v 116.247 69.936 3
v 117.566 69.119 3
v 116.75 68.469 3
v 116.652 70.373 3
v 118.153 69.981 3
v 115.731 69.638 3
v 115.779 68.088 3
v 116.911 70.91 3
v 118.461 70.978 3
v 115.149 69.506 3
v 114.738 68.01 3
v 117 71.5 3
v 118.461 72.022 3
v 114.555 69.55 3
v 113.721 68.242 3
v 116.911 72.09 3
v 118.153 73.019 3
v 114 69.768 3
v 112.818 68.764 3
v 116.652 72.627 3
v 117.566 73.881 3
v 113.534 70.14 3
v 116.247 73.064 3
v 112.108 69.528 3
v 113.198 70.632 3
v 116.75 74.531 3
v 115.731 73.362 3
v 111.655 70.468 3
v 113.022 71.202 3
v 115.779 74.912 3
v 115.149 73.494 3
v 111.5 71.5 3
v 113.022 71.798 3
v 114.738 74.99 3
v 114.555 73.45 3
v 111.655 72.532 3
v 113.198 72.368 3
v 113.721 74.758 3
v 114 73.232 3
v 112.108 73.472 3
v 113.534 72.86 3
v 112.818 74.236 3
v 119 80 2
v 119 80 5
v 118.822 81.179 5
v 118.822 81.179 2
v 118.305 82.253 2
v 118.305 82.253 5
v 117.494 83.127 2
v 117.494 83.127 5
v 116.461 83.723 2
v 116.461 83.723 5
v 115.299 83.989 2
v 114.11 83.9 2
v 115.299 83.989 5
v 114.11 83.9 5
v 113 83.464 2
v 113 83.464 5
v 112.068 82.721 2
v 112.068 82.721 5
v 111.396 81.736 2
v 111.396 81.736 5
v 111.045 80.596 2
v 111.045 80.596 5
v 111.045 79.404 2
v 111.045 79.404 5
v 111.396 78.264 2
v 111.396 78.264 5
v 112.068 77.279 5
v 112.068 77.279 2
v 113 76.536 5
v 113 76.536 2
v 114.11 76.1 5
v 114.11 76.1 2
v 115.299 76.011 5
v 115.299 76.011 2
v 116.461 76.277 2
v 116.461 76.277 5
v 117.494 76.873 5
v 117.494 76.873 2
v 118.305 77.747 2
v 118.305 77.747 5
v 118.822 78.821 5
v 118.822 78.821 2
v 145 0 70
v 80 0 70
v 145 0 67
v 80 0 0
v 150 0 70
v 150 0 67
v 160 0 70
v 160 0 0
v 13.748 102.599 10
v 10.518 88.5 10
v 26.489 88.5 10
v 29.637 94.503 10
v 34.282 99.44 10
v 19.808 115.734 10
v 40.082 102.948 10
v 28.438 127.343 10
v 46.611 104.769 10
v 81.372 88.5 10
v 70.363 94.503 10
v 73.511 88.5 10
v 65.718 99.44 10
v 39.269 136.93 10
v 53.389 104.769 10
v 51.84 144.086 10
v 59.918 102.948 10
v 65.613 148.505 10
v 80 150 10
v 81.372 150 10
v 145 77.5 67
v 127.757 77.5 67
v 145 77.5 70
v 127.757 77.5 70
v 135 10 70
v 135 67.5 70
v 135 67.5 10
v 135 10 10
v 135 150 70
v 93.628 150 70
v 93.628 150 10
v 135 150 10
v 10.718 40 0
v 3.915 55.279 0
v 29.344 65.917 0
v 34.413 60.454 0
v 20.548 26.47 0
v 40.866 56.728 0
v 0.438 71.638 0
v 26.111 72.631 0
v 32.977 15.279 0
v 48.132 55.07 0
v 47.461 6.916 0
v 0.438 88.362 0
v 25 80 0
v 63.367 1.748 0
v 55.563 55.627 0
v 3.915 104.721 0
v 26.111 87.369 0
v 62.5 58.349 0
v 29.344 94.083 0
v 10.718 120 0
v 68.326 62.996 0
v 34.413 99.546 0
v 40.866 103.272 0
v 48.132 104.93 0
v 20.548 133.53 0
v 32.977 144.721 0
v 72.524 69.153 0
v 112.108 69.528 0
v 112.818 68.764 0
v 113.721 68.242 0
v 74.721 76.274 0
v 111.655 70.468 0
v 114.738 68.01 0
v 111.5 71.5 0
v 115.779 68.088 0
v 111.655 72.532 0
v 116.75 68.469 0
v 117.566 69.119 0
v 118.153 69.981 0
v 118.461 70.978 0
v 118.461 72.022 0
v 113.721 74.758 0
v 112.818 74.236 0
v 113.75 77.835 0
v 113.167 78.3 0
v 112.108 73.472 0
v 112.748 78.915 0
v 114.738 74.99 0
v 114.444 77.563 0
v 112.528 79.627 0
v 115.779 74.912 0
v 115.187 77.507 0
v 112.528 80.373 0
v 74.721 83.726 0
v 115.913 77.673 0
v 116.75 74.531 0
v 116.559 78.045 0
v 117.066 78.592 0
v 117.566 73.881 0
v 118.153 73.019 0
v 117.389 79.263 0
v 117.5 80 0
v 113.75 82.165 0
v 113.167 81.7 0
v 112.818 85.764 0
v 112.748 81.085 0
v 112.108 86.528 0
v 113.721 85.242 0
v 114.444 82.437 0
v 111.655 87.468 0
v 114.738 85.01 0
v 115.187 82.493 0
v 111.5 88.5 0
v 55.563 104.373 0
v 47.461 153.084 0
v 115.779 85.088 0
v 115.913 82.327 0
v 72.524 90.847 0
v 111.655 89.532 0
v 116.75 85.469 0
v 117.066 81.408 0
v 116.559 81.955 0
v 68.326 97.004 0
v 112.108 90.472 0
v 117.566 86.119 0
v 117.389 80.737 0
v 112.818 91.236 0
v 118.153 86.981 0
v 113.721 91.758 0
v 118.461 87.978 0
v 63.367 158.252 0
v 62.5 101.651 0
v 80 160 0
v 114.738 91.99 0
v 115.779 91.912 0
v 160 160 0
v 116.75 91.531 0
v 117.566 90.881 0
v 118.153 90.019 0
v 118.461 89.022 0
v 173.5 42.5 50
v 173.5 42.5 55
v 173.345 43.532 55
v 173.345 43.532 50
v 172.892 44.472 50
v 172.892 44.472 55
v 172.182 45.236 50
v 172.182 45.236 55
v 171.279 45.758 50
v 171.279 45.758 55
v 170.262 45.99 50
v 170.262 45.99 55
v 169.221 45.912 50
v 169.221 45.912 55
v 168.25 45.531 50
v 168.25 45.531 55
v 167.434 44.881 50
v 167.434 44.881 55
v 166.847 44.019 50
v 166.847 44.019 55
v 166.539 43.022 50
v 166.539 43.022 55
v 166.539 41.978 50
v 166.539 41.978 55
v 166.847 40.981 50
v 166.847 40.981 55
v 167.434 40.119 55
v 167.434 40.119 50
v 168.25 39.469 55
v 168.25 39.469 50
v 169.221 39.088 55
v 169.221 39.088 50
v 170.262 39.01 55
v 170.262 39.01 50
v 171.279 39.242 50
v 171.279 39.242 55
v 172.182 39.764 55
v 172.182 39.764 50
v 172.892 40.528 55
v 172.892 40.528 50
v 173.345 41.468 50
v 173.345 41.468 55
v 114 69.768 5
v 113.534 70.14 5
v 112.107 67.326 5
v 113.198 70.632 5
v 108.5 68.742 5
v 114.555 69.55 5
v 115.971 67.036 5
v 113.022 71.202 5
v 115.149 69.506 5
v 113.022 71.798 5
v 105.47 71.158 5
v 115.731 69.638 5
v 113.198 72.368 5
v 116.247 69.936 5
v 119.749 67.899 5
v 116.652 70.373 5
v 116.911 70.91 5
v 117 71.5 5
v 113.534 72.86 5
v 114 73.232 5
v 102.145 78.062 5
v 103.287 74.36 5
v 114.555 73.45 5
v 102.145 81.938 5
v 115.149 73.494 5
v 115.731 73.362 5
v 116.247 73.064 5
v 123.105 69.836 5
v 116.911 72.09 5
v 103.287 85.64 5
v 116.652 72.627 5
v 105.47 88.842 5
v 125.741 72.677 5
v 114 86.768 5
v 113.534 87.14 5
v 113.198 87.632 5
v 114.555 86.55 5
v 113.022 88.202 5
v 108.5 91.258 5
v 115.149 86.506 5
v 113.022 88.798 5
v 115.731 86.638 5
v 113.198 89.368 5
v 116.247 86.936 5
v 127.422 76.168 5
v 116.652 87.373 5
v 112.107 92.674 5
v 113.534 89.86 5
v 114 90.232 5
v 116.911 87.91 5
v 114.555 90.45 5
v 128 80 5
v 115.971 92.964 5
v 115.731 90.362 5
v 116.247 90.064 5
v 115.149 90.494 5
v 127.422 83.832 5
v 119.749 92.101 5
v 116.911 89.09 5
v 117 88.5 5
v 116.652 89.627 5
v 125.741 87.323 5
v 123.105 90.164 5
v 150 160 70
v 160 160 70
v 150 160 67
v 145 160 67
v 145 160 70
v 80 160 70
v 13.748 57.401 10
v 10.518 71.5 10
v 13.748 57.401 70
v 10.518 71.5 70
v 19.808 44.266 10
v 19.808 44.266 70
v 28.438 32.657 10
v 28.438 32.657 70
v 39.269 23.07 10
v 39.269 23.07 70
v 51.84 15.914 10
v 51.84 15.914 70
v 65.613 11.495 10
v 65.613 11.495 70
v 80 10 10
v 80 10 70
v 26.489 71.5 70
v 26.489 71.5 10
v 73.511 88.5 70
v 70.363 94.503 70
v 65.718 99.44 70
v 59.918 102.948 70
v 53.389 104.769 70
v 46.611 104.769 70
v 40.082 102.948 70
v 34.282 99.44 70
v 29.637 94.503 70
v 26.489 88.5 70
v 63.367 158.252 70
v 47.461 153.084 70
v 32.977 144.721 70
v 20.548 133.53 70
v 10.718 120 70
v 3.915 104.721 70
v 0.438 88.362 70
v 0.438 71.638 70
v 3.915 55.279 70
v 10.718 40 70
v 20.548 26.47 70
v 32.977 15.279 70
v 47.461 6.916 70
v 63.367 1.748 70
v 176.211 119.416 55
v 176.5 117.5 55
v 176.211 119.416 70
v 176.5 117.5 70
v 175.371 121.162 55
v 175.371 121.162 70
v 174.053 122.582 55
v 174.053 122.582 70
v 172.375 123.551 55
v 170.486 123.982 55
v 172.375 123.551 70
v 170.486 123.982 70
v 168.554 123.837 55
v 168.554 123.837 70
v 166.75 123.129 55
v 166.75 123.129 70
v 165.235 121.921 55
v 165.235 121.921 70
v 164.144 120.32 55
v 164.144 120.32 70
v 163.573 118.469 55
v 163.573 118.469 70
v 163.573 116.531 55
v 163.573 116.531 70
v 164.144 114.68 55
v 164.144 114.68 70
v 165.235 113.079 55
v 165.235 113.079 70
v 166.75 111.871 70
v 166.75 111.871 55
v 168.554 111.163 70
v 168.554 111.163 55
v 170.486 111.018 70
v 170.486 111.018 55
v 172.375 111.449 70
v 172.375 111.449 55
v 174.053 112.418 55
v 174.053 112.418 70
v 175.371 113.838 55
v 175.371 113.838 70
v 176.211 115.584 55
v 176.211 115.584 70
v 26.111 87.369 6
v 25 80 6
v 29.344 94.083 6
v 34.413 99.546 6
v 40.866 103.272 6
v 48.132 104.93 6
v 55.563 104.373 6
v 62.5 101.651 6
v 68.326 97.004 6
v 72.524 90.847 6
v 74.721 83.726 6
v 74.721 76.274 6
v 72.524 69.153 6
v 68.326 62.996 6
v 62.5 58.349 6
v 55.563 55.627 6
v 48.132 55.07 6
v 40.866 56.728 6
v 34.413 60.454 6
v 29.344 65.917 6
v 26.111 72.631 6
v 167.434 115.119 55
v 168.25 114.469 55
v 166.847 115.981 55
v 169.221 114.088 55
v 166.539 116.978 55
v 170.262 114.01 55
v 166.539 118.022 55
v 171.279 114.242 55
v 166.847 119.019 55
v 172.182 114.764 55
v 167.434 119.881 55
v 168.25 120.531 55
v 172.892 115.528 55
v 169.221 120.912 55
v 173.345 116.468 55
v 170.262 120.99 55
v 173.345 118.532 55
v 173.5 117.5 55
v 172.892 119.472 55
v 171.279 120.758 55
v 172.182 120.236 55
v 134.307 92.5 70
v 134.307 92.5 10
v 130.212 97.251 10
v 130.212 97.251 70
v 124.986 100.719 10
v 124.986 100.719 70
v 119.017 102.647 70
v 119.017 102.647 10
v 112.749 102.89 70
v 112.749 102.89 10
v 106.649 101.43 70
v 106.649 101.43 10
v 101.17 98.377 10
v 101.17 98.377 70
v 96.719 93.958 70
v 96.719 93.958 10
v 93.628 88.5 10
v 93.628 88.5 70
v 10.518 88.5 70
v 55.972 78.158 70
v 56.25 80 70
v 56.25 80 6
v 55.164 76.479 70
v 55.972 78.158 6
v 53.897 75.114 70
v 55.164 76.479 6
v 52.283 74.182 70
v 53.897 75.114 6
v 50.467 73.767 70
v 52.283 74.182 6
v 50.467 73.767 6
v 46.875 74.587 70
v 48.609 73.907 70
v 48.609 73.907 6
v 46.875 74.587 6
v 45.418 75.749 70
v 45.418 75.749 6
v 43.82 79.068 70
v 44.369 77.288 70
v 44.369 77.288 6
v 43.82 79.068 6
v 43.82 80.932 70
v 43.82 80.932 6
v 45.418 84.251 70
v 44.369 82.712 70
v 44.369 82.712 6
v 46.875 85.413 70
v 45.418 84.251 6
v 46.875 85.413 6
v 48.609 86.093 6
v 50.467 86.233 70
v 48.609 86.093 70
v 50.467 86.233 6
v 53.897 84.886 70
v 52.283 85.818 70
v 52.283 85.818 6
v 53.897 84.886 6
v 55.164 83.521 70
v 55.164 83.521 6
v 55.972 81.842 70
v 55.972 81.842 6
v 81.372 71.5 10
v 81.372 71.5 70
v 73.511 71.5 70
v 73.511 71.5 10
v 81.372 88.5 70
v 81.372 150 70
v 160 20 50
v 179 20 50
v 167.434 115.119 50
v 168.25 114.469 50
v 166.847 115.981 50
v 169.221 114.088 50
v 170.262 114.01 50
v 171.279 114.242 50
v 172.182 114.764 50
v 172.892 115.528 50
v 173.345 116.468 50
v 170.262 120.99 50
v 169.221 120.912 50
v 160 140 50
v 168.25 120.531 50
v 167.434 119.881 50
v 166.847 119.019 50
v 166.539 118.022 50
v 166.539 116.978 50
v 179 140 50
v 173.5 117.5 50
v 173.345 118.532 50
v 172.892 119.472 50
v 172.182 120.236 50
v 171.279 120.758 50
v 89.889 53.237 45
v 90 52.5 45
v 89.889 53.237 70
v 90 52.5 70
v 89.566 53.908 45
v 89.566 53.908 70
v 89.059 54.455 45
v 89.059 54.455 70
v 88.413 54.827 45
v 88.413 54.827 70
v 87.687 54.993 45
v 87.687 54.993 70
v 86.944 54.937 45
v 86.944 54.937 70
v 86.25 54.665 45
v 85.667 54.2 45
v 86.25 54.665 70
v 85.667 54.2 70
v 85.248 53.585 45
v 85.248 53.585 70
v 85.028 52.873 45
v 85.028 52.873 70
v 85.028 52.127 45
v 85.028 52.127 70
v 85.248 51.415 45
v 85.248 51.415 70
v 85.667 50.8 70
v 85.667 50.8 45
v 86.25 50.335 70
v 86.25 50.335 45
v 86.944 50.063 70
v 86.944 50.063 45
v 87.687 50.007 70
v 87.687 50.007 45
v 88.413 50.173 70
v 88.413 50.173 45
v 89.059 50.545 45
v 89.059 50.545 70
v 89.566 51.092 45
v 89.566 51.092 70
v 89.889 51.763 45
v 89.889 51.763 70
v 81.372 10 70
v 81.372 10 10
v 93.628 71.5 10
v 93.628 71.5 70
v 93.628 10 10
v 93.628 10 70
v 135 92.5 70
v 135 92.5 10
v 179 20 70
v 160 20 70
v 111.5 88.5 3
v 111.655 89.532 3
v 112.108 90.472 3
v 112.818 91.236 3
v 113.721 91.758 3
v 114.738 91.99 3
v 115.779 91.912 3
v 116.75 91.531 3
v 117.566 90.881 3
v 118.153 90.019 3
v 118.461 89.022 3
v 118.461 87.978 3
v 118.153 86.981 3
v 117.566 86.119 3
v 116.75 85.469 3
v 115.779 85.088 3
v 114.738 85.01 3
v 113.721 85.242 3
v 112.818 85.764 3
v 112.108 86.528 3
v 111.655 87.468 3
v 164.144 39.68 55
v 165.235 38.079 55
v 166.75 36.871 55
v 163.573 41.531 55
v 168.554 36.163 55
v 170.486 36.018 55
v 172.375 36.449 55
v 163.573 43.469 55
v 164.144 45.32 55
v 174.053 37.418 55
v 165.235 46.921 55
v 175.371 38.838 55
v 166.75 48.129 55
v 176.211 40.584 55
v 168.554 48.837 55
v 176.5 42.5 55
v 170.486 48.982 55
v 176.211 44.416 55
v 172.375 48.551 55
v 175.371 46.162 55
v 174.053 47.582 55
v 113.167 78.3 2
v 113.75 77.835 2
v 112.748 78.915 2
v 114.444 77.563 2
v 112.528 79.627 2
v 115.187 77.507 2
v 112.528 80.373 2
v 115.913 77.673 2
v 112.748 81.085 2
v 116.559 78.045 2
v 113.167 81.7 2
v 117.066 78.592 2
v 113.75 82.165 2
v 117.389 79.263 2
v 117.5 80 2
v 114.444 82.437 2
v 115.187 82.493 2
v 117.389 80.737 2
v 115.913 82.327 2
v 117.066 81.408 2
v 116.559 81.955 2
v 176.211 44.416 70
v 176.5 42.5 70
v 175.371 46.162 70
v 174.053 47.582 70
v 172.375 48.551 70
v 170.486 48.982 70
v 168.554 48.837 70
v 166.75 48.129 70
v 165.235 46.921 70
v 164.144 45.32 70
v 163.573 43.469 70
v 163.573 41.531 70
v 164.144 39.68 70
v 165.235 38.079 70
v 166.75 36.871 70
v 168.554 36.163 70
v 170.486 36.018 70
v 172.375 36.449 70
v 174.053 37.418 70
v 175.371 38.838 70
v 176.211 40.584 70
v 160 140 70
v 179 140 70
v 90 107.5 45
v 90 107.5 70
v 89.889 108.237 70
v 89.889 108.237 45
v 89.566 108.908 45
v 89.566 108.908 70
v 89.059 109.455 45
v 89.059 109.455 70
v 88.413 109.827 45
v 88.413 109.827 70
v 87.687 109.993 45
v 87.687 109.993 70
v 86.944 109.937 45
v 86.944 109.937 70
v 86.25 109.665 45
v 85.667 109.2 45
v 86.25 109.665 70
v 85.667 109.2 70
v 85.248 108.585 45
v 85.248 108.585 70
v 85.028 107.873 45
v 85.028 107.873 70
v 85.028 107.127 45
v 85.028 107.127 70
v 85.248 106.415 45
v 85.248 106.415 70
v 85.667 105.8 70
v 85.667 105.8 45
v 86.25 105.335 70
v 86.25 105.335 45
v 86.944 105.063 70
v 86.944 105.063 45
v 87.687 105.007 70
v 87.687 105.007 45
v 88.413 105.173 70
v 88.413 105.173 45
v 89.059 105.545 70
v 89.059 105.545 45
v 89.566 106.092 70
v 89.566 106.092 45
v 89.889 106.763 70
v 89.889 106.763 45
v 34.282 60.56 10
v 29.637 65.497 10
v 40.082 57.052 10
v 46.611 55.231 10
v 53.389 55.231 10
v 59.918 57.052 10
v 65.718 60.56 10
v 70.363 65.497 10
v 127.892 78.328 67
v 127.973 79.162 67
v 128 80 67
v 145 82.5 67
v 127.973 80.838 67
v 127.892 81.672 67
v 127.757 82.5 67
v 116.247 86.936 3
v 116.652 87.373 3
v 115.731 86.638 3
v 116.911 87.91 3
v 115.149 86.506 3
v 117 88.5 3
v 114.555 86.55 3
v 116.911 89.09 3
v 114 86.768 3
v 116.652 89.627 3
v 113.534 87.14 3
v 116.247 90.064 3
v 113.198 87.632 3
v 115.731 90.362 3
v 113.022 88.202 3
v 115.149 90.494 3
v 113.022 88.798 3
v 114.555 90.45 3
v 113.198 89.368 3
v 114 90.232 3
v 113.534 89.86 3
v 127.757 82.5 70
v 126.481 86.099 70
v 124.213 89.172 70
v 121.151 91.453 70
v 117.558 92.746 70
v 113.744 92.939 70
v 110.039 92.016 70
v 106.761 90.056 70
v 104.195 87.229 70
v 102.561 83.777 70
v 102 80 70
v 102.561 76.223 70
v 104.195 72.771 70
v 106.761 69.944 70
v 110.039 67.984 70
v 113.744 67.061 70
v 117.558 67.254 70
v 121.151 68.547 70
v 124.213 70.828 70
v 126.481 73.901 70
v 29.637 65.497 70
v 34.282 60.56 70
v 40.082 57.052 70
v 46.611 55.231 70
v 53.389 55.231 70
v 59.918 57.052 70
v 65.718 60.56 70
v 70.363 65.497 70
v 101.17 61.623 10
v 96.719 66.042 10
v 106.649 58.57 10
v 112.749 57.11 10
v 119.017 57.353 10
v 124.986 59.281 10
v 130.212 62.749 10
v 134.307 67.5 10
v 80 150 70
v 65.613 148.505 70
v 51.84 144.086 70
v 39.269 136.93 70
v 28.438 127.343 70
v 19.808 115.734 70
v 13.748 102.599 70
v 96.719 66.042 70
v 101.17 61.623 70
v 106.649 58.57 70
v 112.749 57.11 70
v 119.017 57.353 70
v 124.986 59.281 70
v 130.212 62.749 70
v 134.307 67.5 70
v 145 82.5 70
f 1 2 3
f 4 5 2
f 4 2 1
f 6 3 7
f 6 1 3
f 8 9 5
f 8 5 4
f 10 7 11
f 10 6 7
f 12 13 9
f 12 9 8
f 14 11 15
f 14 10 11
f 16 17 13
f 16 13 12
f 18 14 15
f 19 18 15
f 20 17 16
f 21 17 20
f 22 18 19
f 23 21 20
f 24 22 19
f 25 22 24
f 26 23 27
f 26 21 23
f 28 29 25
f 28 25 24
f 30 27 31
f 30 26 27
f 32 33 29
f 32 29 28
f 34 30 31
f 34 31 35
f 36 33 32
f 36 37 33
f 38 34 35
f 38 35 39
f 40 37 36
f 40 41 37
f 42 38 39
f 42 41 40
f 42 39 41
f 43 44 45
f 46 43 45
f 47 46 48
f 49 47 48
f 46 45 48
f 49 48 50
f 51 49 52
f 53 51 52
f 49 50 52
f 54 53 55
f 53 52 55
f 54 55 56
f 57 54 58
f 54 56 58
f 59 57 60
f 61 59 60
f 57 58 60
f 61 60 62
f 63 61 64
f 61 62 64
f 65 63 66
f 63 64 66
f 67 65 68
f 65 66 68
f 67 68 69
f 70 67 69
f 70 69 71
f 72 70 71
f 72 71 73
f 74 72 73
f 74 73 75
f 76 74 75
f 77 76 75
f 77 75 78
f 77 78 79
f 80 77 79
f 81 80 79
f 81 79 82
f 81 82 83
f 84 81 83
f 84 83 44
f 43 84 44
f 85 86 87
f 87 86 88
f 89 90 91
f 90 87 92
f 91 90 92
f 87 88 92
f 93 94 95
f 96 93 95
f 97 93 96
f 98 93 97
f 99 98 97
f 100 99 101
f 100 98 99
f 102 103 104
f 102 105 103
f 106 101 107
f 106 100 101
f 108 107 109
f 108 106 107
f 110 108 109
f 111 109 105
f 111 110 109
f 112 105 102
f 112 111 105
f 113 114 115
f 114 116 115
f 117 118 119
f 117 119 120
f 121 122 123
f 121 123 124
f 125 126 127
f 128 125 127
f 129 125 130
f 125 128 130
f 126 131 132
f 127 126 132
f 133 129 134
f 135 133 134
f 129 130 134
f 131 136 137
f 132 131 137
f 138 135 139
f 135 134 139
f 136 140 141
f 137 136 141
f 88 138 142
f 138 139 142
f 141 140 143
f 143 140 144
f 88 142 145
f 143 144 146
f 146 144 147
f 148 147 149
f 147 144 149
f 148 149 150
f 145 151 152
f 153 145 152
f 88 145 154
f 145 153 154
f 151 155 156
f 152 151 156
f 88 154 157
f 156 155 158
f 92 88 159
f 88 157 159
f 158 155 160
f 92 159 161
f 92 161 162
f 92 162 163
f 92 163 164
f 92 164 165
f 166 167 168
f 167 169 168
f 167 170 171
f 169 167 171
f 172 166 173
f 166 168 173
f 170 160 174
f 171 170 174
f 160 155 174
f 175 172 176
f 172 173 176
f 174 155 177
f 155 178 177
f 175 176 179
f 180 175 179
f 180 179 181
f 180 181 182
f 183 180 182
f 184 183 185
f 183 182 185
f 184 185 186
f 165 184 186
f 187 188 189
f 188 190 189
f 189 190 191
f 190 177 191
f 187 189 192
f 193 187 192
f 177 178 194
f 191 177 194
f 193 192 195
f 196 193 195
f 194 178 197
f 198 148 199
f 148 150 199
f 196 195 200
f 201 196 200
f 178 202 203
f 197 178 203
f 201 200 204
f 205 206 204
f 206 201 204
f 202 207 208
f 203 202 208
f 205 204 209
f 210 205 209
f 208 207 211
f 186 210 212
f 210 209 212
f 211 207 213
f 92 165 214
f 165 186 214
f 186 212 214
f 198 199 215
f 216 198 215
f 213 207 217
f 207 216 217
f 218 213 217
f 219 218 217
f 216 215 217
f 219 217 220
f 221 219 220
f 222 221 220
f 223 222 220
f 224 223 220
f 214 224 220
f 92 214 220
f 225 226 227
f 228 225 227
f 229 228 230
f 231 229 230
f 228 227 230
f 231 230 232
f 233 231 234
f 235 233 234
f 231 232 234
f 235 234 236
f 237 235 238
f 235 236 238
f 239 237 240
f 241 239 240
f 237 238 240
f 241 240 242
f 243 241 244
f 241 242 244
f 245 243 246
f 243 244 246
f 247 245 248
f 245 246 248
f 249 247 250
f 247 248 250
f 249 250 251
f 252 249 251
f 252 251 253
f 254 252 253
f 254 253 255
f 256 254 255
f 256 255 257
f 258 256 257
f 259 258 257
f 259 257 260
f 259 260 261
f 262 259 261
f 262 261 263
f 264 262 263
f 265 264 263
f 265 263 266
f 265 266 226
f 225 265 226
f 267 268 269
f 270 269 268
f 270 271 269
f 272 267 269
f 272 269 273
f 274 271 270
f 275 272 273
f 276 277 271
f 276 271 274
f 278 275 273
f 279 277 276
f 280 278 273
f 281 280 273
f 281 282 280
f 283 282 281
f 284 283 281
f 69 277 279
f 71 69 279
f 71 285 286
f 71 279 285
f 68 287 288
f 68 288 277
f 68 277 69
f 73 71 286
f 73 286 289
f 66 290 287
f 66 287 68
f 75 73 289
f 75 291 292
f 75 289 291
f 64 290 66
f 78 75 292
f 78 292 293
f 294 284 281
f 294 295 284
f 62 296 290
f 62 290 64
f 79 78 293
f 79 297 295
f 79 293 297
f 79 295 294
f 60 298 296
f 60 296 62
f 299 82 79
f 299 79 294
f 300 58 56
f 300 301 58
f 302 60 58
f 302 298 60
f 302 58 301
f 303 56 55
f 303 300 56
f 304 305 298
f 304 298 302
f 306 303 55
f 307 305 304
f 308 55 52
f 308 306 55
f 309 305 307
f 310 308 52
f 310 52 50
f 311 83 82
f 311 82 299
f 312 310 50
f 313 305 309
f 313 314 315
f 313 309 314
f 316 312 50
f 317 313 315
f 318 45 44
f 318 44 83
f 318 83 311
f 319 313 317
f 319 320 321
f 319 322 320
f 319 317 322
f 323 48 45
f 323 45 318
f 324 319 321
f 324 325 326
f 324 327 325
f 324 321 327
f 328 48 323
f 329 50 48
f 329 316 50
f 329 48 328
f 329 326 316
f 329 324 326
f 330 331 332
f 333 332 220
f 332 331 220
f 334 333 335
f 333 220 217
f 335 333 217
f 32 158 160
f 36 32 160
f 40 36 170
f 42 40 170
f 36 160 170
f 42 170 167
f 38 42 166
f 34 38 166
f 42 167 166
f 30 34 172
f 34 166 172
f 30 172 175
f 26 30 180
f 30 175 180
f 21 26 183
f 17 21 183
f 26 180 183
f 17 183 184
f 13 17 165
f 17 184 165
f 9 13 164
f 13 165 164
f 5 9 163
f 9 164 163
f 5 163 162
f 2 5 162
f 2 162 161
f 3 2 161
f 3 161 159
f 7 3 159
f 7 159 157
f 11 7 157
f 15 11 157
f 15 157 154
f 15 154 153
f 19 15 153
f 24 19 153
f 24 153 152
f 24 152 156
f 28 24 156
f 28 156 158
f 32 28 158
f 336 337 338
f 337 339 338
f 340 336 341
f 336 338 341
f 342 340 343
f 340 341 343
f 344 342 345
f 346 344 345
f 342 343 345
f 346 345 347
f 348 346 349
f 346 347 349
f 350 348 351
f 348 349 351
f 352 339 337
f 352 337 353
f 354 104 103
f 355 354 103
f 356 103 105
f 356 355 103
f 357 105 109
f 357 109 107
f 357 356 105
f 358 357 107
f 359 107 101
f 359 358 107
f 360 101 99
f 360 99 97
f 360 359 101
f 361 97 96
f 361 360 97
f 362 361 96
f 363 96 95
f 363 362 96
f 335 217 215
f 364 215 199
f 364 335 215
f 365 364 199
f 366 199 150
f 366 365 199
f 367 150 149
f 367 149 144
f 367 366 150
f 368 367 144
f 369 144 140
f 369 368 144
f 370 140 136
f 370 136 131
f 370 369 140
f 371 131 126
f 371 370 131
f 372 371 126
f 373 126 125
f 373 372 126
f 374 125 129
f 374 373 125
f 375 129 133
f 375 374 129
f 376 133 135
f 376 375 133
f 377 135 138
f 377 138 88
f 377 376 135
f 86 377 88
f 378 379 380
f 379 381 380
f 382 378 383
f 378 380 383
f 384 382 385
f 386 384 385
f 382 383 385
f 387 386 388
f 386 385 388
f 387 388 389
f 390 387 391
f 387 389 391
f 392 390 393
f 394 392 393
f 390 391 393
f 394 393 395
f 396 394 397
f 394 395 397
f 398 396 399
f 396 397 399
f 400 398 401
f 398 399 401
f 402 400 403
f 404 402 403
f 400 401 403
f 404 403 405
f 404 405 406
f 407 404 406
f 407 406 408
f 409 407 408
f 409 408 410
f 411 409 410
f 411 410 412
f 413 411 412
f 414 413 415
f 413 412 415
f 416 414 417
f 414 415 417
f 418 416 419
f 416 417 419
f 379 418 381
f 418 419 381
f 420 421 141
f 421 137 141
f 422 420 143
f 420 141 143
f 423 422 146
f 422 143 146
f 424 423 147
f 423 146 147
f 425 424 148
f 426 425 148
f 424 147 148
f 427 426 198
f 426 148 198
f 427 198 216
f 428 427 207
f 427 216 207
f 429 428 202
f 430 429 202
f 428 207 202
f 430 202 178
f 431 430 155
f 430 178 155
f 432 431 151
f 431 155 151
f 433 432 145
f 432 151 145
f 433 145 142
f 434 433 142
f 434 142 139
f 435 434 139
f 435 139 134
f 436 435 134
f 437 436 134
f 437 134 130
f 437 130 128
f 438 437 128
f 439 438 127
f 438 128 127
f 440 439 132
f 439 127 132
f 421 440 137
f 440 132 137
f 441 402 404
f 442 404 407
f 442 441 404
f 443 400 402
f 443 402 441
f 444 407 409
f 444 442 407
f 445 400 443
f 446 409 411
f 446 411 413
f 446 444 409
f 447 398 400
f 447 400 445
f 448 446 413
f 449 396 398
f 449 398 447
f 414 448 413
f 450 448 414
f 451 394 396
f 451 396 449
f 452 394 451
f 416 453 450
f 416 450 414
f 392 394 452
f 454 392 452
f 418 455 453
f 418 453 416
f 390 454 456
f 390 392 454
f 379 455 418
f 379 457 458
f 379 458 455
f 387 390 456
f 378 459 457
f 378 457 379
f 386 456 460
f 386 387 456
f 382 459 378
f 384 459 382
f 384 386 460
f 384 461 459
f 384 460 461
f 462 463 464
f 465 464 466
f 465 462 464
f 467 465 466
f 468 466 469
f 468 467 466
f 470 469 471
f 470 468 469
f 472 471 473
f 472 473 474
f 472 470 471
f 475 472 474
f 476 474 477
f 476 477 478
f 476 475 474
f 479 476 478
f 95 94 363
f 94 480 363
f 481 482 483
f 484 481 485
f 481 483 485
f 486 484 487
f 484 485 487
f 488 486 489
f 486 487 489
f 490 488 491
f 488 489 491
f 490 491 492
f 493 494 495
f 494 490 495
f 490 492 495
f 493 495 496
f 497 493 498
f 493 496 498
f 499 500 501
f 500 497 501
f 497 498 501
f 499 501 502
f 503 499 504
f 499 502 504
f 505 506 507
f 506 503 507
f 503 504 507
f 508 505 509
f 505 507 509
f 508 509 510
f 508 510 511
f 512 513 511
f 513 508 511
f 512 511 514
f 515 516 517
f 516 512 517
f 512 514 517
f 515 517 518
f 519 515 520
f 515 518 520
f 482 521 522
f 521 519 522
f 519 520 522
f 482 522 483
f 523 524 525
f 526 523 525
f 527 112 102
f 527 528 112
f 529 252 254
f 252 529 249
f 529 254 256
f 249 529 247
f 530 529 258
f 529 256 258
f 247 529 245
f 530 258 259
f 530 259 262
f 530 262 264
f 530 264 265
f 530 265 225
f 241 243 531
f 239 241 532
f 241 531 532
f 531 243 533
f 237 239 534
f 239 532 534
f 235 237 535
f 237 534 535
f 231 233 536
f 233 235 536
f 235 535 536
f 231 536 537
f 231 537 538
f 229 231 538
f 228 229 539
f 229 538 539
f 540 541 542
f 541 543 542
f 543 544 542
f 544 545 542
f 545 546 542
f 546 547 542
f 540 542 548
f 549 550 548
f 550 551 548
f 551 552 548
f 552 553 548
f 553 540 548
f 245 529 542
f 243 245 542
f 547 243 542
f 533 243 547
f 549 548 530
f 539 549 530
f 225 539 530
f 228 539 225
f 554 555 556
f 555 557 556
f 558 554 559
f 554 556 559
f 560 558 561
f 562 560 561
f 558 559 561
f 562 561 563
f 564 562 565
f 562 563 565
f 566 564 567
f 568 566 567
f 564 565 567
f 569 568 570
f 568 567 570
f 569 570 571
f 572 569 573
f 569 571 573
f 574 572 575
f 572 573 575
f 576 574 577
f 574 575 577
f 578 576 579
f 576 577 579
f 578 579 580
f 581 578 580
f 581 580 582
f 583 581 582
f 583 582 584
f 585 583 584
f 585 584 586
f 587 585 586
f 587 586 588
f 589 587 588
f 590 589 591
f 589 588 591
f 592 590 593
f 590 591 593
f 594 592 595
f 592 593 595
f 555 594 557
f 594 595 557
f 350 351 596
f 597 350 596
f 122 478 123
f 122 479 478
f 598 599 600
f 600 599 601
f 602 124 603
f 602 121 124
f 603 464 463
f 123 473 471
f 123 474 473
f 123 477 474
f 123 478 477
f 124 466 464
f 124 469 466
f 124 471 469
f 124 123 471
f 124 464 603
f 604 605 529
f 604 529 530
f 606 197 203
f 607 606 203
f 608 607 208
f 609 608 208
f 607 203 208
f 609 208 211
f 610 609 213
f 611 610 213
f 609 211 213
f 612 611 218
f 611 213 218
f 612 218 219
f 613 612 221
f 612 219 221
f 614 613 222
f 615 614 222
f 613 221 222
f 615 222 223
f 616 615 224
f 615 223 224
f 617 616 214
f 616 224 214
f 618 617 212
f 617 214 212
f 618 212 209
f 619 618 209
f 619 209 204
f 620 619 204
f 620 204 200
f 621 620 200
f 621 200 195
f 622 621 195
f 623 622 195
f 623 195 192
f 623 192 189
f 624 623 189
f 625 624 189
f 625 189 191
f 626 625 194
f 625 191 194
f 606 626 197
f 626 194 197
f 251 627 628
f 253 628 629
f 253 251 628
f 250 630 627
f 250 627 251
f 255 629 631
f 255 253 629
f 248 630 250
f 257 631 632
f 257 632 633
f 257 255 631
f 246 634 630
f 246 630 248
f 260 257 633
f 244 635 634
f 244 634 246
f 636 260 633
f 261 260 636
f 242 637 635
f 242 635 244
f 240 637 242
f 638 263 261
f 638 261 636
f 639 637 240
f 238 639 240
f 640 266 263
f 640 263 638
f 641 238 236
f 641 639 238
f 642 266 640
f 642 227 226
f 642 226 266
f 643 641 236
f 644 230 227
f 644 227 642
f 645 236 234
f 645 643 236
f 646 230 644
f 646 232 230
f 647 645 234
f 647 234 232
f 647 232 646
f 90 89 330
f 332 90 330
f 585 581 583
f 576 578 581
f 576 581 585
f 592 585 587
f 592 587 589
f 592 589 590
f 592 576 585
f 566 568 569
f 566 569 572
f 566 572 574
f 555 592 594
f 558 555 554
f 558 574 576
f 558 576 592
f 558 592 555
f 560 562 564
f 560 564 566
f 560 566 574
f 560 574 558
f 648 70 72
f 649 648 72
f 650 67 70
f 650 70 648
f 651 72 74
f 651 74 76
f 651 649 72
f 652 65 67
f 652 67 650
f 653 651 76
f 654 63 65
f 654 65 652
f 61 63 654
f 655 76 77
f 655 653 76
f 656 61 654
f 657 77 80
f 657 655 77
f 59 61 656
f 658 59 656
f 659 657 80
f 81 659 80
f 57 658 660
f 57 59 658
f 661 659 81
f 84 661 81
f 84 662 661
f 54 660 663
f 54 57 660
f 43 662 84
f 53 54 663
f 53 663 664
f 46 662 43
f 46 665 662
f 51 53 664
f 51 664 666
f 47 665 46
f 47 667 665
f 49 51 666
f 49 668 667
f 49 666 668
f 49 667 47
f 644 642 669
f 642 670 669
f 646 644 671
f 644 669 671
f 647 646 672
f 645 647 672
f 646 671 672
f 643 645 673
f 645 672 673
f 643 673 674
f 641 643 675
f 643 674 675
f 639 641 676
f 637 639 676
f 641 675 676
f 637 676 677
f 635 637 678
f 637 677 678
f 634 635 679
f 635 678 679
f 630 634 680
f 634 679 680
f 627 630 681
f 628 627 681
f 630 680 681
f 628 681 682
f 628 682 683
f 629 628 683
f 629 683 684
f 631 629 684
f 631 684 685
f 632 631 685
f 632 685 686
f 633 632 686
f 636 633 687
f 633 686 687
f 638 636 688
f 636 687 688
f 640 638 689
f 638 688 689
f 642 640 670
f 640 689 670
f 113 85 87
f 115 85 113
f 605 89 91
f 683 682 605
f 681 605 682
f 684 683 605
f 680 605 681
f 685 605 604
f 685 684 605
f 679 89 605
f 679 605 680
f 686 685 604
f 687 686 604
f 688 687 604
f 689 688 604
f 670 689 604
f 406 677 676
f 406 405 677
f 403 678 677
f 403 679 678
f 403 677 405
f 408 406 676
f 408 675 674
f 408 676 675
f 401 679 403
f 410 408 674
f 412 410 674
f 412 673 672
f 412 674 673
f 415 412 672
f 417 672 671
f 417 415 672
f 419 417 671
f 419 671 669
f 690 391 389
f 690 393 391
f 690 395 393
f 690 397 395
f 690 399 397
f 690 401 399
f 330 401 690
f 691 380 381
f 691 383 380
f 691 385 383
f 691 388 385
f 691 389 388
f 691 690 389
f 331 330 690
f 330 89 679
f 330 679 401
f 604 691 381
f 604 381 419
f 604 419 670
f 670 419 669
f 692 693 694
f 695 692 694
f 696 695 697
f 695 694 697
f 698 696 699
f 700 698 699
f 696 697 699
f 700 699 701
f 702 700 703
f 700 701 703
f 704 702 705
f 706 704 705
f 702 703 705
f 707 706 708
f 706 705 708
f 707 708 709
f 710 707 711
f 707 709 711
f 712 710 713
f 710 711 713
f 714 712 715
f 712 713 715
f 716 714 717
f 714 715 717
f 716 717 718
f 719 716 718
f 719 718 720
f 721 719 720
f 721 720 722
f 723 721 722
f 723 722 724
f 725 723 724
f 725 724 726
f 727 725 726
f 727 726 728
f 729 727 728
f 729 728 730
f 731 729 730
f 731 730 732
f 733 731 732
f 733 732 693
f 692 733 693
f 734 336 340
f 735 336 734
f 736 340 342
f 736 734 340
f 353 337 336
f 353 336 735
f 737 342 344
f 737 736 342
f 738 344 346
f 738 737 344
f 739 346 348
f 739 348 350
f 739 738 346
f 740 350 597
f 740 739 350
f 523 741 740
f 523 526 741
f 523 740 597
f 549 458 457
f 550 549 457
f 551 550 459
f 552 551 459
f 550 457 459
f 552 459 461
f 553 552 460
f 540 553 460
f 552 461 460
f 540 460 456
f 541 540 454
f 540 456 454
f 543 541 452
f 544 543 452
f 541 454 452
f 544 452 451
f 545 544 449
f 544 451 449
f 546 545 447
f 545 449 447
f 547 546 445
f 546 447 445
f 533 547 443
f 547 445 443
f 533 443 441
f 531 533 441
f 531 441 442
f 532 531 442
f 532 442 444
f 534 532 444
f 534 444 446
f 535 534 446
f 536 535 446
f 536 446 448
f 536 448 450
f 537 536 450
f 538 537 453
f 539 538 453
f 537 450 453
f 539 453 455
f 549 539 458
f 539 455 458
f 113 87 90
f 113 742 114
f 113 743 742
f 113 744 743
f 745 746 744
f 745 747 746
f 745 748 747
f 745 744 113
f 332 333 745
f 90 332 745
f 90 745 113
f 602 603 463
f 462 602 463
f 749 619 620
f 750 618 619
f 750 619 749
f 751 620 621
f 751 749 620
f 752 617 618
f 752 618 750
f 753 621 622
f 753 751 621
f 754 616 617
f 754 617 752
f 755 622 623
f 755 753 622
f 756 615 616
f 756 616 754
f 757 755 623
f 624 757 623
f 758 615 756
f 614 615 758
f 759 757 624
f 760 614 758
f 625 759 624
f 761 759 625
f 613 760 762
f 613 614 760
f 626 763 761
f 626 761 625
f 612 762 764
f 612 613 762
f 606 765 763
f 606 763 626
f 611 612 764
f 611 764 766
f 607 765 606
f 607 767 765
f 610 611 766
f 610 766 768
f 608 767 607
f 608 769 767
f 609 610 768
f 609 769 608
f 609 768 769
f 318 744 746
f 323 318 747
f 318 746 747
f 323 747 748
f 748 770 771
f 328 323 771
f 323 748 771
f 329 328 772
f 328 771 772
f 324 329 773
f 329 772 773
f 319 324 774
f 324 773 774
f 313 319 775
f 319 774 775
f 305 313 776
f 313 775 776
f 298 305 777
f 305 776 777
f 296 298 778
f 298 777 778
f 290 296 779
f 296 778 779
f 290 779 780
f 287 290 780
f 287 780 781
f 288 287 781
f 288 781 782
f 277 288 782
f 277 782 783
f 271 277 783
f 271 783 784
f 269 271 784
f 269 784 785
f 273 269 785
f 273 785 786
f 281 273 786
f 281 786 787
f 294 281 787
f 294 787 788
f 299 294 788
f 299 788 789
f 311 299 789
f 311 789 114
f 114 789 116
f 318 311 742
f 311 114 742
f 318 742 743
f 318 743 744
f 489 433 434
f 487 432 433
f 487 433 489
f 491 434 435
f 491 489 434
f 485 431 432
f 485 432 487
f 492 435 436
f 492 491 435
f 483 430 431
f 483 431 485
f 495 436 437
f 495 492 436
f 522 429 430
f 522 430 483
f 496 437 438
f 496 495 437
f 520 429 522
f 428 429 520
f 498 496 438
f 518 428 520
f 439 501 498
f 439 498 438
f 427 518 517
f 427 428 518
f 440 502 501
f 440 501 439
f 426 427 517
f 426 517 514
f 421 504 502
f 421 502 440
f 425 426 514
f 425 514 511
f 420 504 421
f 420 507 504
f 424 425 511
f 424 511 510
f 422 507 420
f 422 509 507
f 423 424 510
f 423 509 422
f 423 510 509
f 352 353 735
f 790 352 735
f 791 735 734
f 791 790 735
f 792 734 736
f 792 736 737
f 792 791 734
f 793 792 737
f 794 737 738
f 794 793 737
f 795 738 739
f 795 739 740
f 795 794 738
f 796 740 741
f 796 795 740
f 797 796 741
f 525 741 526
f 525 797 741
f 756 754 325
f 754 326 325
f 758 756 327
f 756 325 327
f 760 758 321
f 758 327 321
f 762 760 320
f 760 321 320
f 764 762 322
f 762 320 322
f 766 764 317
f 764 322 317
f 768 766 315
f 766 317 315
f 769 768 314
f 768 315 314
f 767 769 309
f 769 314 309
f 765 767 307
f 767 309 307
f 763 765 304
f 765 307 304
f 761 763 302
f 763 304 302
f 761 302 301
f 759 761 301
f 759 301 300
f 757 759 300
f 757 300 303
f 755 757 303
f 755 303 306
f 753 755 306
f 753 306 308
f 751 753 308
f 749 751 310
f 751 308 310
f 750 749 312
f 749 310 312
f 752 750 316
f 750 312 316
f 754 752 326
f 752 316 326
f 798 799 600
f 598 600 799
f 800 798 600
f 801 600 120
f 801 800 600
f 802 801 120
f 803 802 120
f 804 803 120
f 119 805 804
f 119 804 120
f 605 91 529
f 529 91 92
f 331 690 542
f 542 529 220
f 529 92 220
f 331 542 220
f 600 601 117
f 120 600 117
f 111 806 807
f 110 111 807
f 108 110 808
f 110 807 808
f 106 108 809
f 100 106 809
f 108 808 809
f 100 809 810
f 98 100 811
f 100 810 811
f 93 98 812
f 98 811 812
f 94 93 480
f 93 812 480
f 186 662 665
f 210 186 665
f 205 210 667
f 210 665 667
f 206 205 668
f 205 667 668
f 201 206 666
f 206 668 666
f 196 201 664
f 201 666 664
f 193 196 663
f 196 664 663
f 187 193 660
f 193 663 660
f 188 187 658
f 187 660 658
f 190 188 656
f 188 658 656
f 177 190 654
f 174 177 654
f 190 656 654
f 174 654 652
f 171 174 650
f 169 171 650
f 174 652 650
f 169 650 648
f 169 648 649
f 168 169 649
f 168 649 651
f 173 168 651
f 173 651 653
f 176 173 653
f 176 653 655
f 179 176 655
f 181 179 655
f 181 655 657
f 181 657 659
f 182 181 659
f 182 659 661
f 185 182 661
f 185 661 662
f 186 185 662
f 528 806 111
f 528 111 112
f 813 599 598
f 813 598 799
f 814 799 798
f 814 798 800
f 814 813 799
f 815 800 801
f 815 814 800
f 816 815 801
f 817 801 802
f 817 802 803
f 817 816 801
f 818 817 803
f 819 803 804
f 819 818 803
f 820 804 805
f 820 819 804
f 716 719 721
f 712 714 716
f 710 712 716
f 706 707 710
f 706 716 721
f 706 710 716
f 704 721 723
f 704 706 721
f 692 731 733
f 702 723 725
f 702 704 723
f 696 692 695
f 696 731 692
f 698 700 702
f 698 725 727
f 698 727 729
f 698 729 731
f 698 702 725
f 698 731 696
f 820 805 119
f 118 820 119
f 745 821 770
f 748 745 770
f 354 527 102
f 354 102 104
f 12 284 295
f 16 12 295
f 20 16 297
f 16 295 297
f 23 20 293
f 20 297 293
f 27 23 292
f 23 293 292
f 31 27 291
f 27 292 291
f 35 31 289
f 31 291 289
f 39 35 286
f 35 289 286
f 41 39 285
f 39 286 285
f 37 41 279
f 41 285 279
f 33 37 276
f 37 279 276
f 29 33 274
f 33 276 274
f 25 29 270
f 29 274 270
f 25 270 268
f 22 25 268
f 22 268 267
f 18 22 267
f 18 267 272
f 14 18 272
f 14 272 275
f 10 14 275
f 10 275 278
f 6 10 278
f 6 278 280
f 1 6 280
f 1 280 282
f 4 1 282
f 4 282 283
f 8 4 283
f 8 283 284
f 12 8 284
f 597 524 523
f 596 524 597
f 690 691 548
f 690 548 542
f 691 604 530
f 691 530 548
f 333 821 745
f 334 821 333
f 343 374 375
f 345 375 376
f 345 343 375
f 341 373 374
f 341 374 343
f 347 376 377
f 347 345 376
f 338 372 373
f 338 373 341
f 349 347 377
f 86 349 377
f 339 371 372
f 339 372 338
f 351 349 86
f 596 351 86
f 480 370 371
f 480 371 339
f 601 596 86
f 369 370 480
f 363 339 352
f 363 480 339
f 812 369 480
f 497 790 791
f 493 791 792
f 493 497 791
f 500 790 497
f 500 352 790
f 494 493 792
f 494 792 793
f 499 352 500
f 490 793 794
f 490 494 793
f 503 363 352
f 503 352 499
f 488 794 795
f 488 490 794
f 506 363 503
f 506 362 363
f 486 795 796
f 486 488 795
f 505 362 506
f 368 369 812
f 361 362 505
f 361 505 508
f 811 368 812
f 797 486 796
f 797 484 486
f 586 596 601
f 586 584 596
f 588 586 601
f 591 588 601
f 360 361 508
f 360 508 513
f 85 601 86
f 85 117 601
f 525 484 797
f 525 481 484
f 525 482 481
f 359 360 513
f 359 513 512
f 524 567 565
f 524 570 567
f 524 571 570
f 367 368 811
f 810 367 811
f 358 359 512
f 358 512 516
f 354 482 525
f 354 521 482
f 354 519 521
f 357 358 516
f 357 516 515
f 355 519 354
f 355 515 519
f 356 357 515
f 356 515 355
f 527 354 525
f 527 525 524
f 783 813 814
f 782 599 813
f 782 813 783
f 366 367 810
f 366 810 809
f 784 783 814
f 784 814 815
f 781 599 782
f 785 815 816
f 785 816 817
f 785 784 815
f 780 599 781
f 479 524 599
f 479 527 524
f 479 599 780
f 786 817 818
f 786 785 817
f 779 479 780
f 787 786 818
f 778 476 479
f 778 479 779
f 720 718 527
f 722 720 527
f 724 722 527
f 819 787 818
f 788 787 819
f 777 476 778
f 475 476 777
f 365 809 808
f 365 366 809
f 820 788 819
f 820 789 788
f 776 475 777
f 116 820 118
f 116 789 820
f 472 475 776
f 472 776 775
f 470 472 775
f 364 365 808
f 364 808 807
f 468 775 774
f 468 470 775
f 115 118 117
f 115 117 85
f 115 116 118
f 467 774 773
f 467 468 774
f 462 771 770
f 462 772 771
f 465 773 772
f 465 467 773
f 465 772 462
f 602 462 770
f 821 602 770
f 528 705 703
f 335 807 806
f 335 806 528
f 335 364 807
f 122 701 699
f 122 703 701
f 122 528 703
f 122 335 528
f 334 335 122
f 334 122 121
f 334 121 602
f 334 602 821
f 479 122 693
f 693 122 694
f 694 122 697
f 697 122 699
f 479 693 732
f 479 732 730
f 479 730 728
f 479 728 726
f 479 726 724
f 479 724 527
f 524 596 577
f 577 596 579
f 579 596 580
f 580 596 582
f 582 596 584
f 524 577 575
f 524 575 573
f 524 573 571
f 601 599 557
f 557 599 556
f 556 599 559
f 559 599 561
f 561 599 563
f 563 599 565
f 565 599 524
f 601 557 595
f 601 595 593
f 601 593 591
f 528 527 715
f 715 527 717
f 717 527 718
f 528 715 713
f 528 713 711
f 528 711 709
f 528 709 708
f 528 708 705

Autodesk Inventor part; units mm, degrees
ref_plane "YZ Plane" through (0, 0, 0) normal (1, 0, 0) x (0, 1, 0)
ref_plane "XZ Plane" through (0, 0, 0) normal (0, 1, 0) x (-1, 0, 0)
ref_plane "XY Plane" through (0, 0, 0) normal (0, 0, 1) x (1, 0, 0)
sketch "Sketch1" plane through (0, 0, 0) normal (0, 0, 1) x (1, 0, 0)
  line L0 (0, 0) -> (160, 0)
  line L1 (160, 0) -> (160, 160)
  line L2 (160, 160) -> (0, 160)
  line L3 (0, 160) -> (0, 0)
  circle A0 centre (50, 80) radius 6.25
  point P0 (160, 80)
  dimension "d0" = 160
  dimension "d1" = 160
  dimension "d2" = 12.5
  dimension "d7" = 50
extrude "Extrusion1" add sketch "Sketch1" along normal blind 70
sketch "Sketch2" plane through (0, 0, 70) normal (0, 0, 1) x (1, 0, 0)
  circle A0 centre (115, 80) radius 2.5
  line L0 (160, 0) -> (160, 160) projected
  circle A1 centre (50, 80) radius 6.25 projected
  line L1 (0, 0) -> (160, 0) projected
  line L2 (160, 0) -> (160, 160) projected
  line L3 (160, 160) -> (0, 160) projected
  line L4 (0, 160) -> (0, 0) projected
  point P0 (160, 80)
  dimension "d8" = 5
  dimension "d9" = 65
extrude "Extrusion2" cut sketch "Sketch2" against normal through all contours A0
sketch "Sketch5" plane through (0, 0, 70) normal (0, 0, 1) x (1, 0, 0)
  circle A0 centre (50, 80) radius 6.25 projected
  line L0 (0, 0) -> (160, 0) projected
  line L1 (160, 0) -> (160, 160) projected
  line L2 (160, 160) -> (0, 160) projected
  line L3 (0, 160) -> (0, 0) projected
  circle A1 centre (80, 80) radius 80 construction
  line L4 (0, 0) -> (160, 0) projected
  arc A2 (80, 160) -> (80, 0) centre (80, 80) ccw
  line L5 (160, 160) -> (0, 160) projected
  line L6 (80, 160) -> (0, 160)
  line L7 (0, 160) -> (0, 0)
  line L8 (80, 0) -> (0, 0)
  point P0 (0, 80)
extrude "Extrusion5" cut sketch "Sketch5" against normal through all contours L3 A2 L0 | L3 L2 A2
sketch "Sketch21" plane through (0, 0, 70) normal (0, 0, 1) x (1, 0, 0)
  circle A0 centre (115, 80) radius 2.5 projected
  circle A1 centre (115, 80) radius 13
  point P0 (0, 0)
  dimension "d100" = 26
extrude "Extrusion21" cut sketch "Sketch21" against normal blind 65
sketch "Sketch22" plane through (115, 80, 5) normal (0, 0, 1) x (1, 0, 0)
  circle A0 centre (0, 8.5) radius 2
  circle A1 centre (0, -8.5) radius 2
  circle A2 centre (0, 0) radius 2.5 construction
  line L0 (0, 8.5) -> (0, -8.5) construction
  point P0 (-115, -80)
  dimension "d103" = 4
  dimension "d104" = 4
  dimension "d105" = 17
extrude "Extrusion22" cut sketch "Sketch22" against normal through all
sketch "Sketch23" plane through (0, 0, 0) normal (0, 0, -1) x (-1, 0, 0)
  circle A0 centre (-115, 88.5) radius 2 projected
  circle A1 centre (-115, 71.5) radius 2 projected
  circle A2 centre (-115, 88.5) radius 3.5
  circle A3 centre (-115, 71.5) radius 3.5
  point P0 (0, 0)
  dimension "d108" = 7
  dimension "d109" = 7
extrude "Extrusion23" cut sketch "Sketch23" against normal blind 3 contours A0 | A1 | A2 | A3
sketch "Sketch24" plane through (115, 80, 5) normal (0, 0, 1) x (1, 0, 0)
  circle A0 centre (0, 0) radius 2.5 projected
  circle A1 centre (0, 0) radius 4
  point P0 (-115, -80)
  dimension "d112" = 8
extrude "Extrusion24" cut sketch "Sketch24" against normal blind 3
sketch "Sketch25" plane through (0, 0, 70) normal (0, 0, 1) x (1, 0, 0)
  line L0 (115, 77.5) -> (150, 77.5)
  line L1 (150, 77.5) -> (150, 82.5)
  line L2 (150, 82.5) -> (115, 82.5)
  line L3 (115, 82.5) -> (115, 77.5)
  line L4 (160, 0) -> (160, 160) projected
  line L5 (80, 0) -> (160, 0) projected
  line L6 (160, 160) -> (80, 160) projected
  line L7 (150, 0) -> (145, 0)
  line L8 (145, 0) -> (145, 160)
  line L9 (145, 160) -> (150, 160)
  line L10 (150, 160) -> (150, 0)
  point P0 (0, 0)
  point P1 (115, 88.5)
  point P2 (150, 80)
  point P3 (160, 80)
  dimension "d115" = 10
  dimension "d116" = 5
  dimension "d119" = 5
extrude "Extrusion25" cut sketch "Sketch25" against normal blind 3 contours L3 L2 L8 L0 | L8 L2 L1 L0 | L0 L10 L5 L8 | L8 L6 L10 L2
sketch "Sketch26" plane through (0, 0, 70) normal (0, 0, 1) x (1, 0, 0)
  line L0 (160, 0) -> (160, 160) projected
  line L1 (160, 20) -> (179, 20)
  line L2 (179, 20) -> (179, 140)
  line L3 (179, 140) -> (160, 140)
  line L4 (160, 140) -> (160, 20)
  line L5 (80, 0) -> (145, 0) projected
  line L6 (145, 160) -> (80, 160) projected
  circle A0 centre (170, 42.5) radius 3.5
  line L7 (170, 117.5) -> (170, 42.5) construction
  circle A1 centre (170, 117.5) radius 3.5
  point P0 (0, 0)
  point P1 (179, 80)
  point P2 (170, 80)
  dimension "d120" = 19
  dimension "d121" = 20
  dimension "d122" = 20
  dimension "d123" = 7
  dimension "d124" = 10
  dimension "d142" = 75
  dimension "d143" = 7
extrude "Extrusion26" add sketch "Sketch26" against normal blind 20
sketch "Sketch27" plane through (0, 0, 70) normal (0, 0, 1) x (1, 0, 0)
  line L0 (179, 52.5) -> (87.5, 52.5) construction
  line L1 (87.5, 52.5) -> (87.5, 107.5) construction
  line L2 (87.5, 107.5) -> (179, 107.5) construction
  line L3 (179, 107.5) -> (179, 52.5) construction
  line L4 (179, 20) -> (179, 140) construction
  circle A0 centre (87.5, 52.5) radius 2.5
  circle A1 centre (87.5, 107.5) radius 2.5
  point P0 (0, 0)
  point P1 (179, 80)
  dimension "d127" = 91.5
  dimension "d128" = 55
  dimension "d129" = 5
  dimension "d130" = 5
extrude "Extrusion27" cut sketch "Sketch27" against normal blind 25
sketch "Sketch28" plane through (0, 0, 0) normal (0, 0, -1) x (-1, 0, 0)
  circle A0 centre (-50, 80) radius 25
  circle A1 centre (-50, 80) radius 6.25 projected
  point P0 (0, 0)
  dimension "d133" = 50
extrude "Extrusion28" cut sketch "Sketch28" against normal blind 6 contours A0 | A1
sketch "Sketch29" plane through (0, 0, 70) normal (0, 0, 1) x (1, 0, 0)
  circle A0 centre (170, 42.5) radius 3.5 projected
  circle A1 centre (170, 42.5) radius 6.5
  circle A2 centre (170, 117.5) radius 3.5 projected
  circle A3 centre (170, 117.5) radius 6.5
  point P0 (0, 0)
  dimension "d136" = 13
  dimension "d144" = 13
extrude "Extrusion29" cut sketch "Sketch29" against normal blind 15 contours A0 | A1 | A3
sketch "Sketch30" plane through (0, 0, 70) normal (0, 0, 1) x (1, 0, 0)
  circle A0 centre (87.5, 52.5) radius 2.5 projected
  circle A1 centre (87.5, 107.5) radius 2.5 projected
  line L0 (145, 82.5) -> (145, 160) projected
  line L1 (145, 160) -> (80, 160) projected
  arc A2 (80, 160) -> (80, 0) centre (80, 80) ccw projected
  line L2 (80, 0) -> (145, 0) projected
  line L3 (145, 0) -> (145, 77.5) projected
  line L4 (145, 77.5) -> (127.7574, 77.5) projected
  arc A3 (127.7574, 82.5) -> (127.7574, 77.5) centre (115, 80) ccw projected
  line L5 (127.7574, 82.5) -> (145, 82.5) projected
  circle A4 centre (50, 80) radius 6.25 construction
  circle A5 centre (50, 80) radius 25 construction
  circle A6 centre (115, 88.5) radius 3.5 projected
  circle A7 centre (115, 71.5) radius 3.5 projected
  arc A8 (80, 160) -> (80, 0) centre (80, 80) ccw projected
  line L6 (160, 160) -> (80, 160) projected
  line L7 (160, 0) -> (160, 160) projected
  line L8 (80, 0) -> (160, 0) projected
  circle A9 centre (115, 80) radius 2.5 projected
  arc A10 (80, 150) -> (80, 10) centre (80, 80) ccw construction
  line L9 (80, 150) -> (135, 150) construction
  line L10 (135, 150) -> (135, 92.5)
  line L11 (135, 92.5) -> (134.3067, 92.5)
  arc A11 (134.3067, 92.5) -> (134.3067, 67.5) centre (115, 80) ccw construction
  line L12 (134.3067, 67.5) -> (135, 67.5)
  line L13 (135, 67.5) -> (135, 10)
  line L14 (135, 10) -> (80, 10) construction
  line L15 (93.6283, 71.5) -> (10.518, 71.5) construction
  line L16 (93.6283, 88.5) -> (10.518, 88.5) construction
  arc A12 (80, 150) -> (10.518, 88.5) centre (80, 80) ccw
  arc A13 (10.518, 71.5) -> (80, 10) centre (80, 80) ccw
  arc A14 (134.3067, 92.5) -> (93.6283, 88.5) centre (115, 80) ccw
  arc A15 (93.6283, 71.5) -> (134.3067, 67.5) centre (115, 80) ccw
  line L17 (81.3717, 150) -> (81.3717, 10) construction
  line L18 (93.6283, 88.5) -> (93.6283, 150)
  line L19 (93.6283, 71.5) -> (93.6283, 10)
  line L20 (87.5, 52.5) -> (87.5, 107.5) construction
  line L21 (80, 150) -> (81.3717, 150)
  line L22 (80, 10) -> (81.3717, 10)
  line L23 (93.6283, 10) -> (135, 10)
  line L24 (93.6283, 150) -> (135, 150)
  line L25 (81.3717, 150) -> (81.3717, 88.5)
  line L26 (81.3717, 71.5) -> (81.3717, 10)
  line L27 (10.518, 71.5) -> (81.3717, 71.5) construction
  line L28 (10.518, 88.5) -> (81.3717, 88.5) construction
  line L29 (10.518, 88.5) -> (26.4894, 88.5)
  circle A16 centre (50, 80) radius 25 construction
  line L30 (10.518, 71.5) -> (26.4894, 71.5)
  line L31 (81.3717, 71.5) -> (73.5106, 71.5)
  line L32 (81.3717, 88.5) -> (73.5106, 88.5)
  arc A17 (73.5106, 88.5) -> (26.4894, 88.5) centre (50, 80) ccw
  arc A18 (26.4894, 71.5) -> (73.5106, 71.5) centre (50, 80) ccw
  point P0 (0, 0)
  dimension "d139" = 10
extrude "Extrusion30" cut sketch "Sketch30" against normal blind 60 contours L10 L11 A14 L18 L24 | L12 L13 L23 L19 A15 | L21 L25 L32 A17 L29 A12 | L30 A18 L31 L26 L22 A13
properties part number "AA005b" material "ABS Plastic"
